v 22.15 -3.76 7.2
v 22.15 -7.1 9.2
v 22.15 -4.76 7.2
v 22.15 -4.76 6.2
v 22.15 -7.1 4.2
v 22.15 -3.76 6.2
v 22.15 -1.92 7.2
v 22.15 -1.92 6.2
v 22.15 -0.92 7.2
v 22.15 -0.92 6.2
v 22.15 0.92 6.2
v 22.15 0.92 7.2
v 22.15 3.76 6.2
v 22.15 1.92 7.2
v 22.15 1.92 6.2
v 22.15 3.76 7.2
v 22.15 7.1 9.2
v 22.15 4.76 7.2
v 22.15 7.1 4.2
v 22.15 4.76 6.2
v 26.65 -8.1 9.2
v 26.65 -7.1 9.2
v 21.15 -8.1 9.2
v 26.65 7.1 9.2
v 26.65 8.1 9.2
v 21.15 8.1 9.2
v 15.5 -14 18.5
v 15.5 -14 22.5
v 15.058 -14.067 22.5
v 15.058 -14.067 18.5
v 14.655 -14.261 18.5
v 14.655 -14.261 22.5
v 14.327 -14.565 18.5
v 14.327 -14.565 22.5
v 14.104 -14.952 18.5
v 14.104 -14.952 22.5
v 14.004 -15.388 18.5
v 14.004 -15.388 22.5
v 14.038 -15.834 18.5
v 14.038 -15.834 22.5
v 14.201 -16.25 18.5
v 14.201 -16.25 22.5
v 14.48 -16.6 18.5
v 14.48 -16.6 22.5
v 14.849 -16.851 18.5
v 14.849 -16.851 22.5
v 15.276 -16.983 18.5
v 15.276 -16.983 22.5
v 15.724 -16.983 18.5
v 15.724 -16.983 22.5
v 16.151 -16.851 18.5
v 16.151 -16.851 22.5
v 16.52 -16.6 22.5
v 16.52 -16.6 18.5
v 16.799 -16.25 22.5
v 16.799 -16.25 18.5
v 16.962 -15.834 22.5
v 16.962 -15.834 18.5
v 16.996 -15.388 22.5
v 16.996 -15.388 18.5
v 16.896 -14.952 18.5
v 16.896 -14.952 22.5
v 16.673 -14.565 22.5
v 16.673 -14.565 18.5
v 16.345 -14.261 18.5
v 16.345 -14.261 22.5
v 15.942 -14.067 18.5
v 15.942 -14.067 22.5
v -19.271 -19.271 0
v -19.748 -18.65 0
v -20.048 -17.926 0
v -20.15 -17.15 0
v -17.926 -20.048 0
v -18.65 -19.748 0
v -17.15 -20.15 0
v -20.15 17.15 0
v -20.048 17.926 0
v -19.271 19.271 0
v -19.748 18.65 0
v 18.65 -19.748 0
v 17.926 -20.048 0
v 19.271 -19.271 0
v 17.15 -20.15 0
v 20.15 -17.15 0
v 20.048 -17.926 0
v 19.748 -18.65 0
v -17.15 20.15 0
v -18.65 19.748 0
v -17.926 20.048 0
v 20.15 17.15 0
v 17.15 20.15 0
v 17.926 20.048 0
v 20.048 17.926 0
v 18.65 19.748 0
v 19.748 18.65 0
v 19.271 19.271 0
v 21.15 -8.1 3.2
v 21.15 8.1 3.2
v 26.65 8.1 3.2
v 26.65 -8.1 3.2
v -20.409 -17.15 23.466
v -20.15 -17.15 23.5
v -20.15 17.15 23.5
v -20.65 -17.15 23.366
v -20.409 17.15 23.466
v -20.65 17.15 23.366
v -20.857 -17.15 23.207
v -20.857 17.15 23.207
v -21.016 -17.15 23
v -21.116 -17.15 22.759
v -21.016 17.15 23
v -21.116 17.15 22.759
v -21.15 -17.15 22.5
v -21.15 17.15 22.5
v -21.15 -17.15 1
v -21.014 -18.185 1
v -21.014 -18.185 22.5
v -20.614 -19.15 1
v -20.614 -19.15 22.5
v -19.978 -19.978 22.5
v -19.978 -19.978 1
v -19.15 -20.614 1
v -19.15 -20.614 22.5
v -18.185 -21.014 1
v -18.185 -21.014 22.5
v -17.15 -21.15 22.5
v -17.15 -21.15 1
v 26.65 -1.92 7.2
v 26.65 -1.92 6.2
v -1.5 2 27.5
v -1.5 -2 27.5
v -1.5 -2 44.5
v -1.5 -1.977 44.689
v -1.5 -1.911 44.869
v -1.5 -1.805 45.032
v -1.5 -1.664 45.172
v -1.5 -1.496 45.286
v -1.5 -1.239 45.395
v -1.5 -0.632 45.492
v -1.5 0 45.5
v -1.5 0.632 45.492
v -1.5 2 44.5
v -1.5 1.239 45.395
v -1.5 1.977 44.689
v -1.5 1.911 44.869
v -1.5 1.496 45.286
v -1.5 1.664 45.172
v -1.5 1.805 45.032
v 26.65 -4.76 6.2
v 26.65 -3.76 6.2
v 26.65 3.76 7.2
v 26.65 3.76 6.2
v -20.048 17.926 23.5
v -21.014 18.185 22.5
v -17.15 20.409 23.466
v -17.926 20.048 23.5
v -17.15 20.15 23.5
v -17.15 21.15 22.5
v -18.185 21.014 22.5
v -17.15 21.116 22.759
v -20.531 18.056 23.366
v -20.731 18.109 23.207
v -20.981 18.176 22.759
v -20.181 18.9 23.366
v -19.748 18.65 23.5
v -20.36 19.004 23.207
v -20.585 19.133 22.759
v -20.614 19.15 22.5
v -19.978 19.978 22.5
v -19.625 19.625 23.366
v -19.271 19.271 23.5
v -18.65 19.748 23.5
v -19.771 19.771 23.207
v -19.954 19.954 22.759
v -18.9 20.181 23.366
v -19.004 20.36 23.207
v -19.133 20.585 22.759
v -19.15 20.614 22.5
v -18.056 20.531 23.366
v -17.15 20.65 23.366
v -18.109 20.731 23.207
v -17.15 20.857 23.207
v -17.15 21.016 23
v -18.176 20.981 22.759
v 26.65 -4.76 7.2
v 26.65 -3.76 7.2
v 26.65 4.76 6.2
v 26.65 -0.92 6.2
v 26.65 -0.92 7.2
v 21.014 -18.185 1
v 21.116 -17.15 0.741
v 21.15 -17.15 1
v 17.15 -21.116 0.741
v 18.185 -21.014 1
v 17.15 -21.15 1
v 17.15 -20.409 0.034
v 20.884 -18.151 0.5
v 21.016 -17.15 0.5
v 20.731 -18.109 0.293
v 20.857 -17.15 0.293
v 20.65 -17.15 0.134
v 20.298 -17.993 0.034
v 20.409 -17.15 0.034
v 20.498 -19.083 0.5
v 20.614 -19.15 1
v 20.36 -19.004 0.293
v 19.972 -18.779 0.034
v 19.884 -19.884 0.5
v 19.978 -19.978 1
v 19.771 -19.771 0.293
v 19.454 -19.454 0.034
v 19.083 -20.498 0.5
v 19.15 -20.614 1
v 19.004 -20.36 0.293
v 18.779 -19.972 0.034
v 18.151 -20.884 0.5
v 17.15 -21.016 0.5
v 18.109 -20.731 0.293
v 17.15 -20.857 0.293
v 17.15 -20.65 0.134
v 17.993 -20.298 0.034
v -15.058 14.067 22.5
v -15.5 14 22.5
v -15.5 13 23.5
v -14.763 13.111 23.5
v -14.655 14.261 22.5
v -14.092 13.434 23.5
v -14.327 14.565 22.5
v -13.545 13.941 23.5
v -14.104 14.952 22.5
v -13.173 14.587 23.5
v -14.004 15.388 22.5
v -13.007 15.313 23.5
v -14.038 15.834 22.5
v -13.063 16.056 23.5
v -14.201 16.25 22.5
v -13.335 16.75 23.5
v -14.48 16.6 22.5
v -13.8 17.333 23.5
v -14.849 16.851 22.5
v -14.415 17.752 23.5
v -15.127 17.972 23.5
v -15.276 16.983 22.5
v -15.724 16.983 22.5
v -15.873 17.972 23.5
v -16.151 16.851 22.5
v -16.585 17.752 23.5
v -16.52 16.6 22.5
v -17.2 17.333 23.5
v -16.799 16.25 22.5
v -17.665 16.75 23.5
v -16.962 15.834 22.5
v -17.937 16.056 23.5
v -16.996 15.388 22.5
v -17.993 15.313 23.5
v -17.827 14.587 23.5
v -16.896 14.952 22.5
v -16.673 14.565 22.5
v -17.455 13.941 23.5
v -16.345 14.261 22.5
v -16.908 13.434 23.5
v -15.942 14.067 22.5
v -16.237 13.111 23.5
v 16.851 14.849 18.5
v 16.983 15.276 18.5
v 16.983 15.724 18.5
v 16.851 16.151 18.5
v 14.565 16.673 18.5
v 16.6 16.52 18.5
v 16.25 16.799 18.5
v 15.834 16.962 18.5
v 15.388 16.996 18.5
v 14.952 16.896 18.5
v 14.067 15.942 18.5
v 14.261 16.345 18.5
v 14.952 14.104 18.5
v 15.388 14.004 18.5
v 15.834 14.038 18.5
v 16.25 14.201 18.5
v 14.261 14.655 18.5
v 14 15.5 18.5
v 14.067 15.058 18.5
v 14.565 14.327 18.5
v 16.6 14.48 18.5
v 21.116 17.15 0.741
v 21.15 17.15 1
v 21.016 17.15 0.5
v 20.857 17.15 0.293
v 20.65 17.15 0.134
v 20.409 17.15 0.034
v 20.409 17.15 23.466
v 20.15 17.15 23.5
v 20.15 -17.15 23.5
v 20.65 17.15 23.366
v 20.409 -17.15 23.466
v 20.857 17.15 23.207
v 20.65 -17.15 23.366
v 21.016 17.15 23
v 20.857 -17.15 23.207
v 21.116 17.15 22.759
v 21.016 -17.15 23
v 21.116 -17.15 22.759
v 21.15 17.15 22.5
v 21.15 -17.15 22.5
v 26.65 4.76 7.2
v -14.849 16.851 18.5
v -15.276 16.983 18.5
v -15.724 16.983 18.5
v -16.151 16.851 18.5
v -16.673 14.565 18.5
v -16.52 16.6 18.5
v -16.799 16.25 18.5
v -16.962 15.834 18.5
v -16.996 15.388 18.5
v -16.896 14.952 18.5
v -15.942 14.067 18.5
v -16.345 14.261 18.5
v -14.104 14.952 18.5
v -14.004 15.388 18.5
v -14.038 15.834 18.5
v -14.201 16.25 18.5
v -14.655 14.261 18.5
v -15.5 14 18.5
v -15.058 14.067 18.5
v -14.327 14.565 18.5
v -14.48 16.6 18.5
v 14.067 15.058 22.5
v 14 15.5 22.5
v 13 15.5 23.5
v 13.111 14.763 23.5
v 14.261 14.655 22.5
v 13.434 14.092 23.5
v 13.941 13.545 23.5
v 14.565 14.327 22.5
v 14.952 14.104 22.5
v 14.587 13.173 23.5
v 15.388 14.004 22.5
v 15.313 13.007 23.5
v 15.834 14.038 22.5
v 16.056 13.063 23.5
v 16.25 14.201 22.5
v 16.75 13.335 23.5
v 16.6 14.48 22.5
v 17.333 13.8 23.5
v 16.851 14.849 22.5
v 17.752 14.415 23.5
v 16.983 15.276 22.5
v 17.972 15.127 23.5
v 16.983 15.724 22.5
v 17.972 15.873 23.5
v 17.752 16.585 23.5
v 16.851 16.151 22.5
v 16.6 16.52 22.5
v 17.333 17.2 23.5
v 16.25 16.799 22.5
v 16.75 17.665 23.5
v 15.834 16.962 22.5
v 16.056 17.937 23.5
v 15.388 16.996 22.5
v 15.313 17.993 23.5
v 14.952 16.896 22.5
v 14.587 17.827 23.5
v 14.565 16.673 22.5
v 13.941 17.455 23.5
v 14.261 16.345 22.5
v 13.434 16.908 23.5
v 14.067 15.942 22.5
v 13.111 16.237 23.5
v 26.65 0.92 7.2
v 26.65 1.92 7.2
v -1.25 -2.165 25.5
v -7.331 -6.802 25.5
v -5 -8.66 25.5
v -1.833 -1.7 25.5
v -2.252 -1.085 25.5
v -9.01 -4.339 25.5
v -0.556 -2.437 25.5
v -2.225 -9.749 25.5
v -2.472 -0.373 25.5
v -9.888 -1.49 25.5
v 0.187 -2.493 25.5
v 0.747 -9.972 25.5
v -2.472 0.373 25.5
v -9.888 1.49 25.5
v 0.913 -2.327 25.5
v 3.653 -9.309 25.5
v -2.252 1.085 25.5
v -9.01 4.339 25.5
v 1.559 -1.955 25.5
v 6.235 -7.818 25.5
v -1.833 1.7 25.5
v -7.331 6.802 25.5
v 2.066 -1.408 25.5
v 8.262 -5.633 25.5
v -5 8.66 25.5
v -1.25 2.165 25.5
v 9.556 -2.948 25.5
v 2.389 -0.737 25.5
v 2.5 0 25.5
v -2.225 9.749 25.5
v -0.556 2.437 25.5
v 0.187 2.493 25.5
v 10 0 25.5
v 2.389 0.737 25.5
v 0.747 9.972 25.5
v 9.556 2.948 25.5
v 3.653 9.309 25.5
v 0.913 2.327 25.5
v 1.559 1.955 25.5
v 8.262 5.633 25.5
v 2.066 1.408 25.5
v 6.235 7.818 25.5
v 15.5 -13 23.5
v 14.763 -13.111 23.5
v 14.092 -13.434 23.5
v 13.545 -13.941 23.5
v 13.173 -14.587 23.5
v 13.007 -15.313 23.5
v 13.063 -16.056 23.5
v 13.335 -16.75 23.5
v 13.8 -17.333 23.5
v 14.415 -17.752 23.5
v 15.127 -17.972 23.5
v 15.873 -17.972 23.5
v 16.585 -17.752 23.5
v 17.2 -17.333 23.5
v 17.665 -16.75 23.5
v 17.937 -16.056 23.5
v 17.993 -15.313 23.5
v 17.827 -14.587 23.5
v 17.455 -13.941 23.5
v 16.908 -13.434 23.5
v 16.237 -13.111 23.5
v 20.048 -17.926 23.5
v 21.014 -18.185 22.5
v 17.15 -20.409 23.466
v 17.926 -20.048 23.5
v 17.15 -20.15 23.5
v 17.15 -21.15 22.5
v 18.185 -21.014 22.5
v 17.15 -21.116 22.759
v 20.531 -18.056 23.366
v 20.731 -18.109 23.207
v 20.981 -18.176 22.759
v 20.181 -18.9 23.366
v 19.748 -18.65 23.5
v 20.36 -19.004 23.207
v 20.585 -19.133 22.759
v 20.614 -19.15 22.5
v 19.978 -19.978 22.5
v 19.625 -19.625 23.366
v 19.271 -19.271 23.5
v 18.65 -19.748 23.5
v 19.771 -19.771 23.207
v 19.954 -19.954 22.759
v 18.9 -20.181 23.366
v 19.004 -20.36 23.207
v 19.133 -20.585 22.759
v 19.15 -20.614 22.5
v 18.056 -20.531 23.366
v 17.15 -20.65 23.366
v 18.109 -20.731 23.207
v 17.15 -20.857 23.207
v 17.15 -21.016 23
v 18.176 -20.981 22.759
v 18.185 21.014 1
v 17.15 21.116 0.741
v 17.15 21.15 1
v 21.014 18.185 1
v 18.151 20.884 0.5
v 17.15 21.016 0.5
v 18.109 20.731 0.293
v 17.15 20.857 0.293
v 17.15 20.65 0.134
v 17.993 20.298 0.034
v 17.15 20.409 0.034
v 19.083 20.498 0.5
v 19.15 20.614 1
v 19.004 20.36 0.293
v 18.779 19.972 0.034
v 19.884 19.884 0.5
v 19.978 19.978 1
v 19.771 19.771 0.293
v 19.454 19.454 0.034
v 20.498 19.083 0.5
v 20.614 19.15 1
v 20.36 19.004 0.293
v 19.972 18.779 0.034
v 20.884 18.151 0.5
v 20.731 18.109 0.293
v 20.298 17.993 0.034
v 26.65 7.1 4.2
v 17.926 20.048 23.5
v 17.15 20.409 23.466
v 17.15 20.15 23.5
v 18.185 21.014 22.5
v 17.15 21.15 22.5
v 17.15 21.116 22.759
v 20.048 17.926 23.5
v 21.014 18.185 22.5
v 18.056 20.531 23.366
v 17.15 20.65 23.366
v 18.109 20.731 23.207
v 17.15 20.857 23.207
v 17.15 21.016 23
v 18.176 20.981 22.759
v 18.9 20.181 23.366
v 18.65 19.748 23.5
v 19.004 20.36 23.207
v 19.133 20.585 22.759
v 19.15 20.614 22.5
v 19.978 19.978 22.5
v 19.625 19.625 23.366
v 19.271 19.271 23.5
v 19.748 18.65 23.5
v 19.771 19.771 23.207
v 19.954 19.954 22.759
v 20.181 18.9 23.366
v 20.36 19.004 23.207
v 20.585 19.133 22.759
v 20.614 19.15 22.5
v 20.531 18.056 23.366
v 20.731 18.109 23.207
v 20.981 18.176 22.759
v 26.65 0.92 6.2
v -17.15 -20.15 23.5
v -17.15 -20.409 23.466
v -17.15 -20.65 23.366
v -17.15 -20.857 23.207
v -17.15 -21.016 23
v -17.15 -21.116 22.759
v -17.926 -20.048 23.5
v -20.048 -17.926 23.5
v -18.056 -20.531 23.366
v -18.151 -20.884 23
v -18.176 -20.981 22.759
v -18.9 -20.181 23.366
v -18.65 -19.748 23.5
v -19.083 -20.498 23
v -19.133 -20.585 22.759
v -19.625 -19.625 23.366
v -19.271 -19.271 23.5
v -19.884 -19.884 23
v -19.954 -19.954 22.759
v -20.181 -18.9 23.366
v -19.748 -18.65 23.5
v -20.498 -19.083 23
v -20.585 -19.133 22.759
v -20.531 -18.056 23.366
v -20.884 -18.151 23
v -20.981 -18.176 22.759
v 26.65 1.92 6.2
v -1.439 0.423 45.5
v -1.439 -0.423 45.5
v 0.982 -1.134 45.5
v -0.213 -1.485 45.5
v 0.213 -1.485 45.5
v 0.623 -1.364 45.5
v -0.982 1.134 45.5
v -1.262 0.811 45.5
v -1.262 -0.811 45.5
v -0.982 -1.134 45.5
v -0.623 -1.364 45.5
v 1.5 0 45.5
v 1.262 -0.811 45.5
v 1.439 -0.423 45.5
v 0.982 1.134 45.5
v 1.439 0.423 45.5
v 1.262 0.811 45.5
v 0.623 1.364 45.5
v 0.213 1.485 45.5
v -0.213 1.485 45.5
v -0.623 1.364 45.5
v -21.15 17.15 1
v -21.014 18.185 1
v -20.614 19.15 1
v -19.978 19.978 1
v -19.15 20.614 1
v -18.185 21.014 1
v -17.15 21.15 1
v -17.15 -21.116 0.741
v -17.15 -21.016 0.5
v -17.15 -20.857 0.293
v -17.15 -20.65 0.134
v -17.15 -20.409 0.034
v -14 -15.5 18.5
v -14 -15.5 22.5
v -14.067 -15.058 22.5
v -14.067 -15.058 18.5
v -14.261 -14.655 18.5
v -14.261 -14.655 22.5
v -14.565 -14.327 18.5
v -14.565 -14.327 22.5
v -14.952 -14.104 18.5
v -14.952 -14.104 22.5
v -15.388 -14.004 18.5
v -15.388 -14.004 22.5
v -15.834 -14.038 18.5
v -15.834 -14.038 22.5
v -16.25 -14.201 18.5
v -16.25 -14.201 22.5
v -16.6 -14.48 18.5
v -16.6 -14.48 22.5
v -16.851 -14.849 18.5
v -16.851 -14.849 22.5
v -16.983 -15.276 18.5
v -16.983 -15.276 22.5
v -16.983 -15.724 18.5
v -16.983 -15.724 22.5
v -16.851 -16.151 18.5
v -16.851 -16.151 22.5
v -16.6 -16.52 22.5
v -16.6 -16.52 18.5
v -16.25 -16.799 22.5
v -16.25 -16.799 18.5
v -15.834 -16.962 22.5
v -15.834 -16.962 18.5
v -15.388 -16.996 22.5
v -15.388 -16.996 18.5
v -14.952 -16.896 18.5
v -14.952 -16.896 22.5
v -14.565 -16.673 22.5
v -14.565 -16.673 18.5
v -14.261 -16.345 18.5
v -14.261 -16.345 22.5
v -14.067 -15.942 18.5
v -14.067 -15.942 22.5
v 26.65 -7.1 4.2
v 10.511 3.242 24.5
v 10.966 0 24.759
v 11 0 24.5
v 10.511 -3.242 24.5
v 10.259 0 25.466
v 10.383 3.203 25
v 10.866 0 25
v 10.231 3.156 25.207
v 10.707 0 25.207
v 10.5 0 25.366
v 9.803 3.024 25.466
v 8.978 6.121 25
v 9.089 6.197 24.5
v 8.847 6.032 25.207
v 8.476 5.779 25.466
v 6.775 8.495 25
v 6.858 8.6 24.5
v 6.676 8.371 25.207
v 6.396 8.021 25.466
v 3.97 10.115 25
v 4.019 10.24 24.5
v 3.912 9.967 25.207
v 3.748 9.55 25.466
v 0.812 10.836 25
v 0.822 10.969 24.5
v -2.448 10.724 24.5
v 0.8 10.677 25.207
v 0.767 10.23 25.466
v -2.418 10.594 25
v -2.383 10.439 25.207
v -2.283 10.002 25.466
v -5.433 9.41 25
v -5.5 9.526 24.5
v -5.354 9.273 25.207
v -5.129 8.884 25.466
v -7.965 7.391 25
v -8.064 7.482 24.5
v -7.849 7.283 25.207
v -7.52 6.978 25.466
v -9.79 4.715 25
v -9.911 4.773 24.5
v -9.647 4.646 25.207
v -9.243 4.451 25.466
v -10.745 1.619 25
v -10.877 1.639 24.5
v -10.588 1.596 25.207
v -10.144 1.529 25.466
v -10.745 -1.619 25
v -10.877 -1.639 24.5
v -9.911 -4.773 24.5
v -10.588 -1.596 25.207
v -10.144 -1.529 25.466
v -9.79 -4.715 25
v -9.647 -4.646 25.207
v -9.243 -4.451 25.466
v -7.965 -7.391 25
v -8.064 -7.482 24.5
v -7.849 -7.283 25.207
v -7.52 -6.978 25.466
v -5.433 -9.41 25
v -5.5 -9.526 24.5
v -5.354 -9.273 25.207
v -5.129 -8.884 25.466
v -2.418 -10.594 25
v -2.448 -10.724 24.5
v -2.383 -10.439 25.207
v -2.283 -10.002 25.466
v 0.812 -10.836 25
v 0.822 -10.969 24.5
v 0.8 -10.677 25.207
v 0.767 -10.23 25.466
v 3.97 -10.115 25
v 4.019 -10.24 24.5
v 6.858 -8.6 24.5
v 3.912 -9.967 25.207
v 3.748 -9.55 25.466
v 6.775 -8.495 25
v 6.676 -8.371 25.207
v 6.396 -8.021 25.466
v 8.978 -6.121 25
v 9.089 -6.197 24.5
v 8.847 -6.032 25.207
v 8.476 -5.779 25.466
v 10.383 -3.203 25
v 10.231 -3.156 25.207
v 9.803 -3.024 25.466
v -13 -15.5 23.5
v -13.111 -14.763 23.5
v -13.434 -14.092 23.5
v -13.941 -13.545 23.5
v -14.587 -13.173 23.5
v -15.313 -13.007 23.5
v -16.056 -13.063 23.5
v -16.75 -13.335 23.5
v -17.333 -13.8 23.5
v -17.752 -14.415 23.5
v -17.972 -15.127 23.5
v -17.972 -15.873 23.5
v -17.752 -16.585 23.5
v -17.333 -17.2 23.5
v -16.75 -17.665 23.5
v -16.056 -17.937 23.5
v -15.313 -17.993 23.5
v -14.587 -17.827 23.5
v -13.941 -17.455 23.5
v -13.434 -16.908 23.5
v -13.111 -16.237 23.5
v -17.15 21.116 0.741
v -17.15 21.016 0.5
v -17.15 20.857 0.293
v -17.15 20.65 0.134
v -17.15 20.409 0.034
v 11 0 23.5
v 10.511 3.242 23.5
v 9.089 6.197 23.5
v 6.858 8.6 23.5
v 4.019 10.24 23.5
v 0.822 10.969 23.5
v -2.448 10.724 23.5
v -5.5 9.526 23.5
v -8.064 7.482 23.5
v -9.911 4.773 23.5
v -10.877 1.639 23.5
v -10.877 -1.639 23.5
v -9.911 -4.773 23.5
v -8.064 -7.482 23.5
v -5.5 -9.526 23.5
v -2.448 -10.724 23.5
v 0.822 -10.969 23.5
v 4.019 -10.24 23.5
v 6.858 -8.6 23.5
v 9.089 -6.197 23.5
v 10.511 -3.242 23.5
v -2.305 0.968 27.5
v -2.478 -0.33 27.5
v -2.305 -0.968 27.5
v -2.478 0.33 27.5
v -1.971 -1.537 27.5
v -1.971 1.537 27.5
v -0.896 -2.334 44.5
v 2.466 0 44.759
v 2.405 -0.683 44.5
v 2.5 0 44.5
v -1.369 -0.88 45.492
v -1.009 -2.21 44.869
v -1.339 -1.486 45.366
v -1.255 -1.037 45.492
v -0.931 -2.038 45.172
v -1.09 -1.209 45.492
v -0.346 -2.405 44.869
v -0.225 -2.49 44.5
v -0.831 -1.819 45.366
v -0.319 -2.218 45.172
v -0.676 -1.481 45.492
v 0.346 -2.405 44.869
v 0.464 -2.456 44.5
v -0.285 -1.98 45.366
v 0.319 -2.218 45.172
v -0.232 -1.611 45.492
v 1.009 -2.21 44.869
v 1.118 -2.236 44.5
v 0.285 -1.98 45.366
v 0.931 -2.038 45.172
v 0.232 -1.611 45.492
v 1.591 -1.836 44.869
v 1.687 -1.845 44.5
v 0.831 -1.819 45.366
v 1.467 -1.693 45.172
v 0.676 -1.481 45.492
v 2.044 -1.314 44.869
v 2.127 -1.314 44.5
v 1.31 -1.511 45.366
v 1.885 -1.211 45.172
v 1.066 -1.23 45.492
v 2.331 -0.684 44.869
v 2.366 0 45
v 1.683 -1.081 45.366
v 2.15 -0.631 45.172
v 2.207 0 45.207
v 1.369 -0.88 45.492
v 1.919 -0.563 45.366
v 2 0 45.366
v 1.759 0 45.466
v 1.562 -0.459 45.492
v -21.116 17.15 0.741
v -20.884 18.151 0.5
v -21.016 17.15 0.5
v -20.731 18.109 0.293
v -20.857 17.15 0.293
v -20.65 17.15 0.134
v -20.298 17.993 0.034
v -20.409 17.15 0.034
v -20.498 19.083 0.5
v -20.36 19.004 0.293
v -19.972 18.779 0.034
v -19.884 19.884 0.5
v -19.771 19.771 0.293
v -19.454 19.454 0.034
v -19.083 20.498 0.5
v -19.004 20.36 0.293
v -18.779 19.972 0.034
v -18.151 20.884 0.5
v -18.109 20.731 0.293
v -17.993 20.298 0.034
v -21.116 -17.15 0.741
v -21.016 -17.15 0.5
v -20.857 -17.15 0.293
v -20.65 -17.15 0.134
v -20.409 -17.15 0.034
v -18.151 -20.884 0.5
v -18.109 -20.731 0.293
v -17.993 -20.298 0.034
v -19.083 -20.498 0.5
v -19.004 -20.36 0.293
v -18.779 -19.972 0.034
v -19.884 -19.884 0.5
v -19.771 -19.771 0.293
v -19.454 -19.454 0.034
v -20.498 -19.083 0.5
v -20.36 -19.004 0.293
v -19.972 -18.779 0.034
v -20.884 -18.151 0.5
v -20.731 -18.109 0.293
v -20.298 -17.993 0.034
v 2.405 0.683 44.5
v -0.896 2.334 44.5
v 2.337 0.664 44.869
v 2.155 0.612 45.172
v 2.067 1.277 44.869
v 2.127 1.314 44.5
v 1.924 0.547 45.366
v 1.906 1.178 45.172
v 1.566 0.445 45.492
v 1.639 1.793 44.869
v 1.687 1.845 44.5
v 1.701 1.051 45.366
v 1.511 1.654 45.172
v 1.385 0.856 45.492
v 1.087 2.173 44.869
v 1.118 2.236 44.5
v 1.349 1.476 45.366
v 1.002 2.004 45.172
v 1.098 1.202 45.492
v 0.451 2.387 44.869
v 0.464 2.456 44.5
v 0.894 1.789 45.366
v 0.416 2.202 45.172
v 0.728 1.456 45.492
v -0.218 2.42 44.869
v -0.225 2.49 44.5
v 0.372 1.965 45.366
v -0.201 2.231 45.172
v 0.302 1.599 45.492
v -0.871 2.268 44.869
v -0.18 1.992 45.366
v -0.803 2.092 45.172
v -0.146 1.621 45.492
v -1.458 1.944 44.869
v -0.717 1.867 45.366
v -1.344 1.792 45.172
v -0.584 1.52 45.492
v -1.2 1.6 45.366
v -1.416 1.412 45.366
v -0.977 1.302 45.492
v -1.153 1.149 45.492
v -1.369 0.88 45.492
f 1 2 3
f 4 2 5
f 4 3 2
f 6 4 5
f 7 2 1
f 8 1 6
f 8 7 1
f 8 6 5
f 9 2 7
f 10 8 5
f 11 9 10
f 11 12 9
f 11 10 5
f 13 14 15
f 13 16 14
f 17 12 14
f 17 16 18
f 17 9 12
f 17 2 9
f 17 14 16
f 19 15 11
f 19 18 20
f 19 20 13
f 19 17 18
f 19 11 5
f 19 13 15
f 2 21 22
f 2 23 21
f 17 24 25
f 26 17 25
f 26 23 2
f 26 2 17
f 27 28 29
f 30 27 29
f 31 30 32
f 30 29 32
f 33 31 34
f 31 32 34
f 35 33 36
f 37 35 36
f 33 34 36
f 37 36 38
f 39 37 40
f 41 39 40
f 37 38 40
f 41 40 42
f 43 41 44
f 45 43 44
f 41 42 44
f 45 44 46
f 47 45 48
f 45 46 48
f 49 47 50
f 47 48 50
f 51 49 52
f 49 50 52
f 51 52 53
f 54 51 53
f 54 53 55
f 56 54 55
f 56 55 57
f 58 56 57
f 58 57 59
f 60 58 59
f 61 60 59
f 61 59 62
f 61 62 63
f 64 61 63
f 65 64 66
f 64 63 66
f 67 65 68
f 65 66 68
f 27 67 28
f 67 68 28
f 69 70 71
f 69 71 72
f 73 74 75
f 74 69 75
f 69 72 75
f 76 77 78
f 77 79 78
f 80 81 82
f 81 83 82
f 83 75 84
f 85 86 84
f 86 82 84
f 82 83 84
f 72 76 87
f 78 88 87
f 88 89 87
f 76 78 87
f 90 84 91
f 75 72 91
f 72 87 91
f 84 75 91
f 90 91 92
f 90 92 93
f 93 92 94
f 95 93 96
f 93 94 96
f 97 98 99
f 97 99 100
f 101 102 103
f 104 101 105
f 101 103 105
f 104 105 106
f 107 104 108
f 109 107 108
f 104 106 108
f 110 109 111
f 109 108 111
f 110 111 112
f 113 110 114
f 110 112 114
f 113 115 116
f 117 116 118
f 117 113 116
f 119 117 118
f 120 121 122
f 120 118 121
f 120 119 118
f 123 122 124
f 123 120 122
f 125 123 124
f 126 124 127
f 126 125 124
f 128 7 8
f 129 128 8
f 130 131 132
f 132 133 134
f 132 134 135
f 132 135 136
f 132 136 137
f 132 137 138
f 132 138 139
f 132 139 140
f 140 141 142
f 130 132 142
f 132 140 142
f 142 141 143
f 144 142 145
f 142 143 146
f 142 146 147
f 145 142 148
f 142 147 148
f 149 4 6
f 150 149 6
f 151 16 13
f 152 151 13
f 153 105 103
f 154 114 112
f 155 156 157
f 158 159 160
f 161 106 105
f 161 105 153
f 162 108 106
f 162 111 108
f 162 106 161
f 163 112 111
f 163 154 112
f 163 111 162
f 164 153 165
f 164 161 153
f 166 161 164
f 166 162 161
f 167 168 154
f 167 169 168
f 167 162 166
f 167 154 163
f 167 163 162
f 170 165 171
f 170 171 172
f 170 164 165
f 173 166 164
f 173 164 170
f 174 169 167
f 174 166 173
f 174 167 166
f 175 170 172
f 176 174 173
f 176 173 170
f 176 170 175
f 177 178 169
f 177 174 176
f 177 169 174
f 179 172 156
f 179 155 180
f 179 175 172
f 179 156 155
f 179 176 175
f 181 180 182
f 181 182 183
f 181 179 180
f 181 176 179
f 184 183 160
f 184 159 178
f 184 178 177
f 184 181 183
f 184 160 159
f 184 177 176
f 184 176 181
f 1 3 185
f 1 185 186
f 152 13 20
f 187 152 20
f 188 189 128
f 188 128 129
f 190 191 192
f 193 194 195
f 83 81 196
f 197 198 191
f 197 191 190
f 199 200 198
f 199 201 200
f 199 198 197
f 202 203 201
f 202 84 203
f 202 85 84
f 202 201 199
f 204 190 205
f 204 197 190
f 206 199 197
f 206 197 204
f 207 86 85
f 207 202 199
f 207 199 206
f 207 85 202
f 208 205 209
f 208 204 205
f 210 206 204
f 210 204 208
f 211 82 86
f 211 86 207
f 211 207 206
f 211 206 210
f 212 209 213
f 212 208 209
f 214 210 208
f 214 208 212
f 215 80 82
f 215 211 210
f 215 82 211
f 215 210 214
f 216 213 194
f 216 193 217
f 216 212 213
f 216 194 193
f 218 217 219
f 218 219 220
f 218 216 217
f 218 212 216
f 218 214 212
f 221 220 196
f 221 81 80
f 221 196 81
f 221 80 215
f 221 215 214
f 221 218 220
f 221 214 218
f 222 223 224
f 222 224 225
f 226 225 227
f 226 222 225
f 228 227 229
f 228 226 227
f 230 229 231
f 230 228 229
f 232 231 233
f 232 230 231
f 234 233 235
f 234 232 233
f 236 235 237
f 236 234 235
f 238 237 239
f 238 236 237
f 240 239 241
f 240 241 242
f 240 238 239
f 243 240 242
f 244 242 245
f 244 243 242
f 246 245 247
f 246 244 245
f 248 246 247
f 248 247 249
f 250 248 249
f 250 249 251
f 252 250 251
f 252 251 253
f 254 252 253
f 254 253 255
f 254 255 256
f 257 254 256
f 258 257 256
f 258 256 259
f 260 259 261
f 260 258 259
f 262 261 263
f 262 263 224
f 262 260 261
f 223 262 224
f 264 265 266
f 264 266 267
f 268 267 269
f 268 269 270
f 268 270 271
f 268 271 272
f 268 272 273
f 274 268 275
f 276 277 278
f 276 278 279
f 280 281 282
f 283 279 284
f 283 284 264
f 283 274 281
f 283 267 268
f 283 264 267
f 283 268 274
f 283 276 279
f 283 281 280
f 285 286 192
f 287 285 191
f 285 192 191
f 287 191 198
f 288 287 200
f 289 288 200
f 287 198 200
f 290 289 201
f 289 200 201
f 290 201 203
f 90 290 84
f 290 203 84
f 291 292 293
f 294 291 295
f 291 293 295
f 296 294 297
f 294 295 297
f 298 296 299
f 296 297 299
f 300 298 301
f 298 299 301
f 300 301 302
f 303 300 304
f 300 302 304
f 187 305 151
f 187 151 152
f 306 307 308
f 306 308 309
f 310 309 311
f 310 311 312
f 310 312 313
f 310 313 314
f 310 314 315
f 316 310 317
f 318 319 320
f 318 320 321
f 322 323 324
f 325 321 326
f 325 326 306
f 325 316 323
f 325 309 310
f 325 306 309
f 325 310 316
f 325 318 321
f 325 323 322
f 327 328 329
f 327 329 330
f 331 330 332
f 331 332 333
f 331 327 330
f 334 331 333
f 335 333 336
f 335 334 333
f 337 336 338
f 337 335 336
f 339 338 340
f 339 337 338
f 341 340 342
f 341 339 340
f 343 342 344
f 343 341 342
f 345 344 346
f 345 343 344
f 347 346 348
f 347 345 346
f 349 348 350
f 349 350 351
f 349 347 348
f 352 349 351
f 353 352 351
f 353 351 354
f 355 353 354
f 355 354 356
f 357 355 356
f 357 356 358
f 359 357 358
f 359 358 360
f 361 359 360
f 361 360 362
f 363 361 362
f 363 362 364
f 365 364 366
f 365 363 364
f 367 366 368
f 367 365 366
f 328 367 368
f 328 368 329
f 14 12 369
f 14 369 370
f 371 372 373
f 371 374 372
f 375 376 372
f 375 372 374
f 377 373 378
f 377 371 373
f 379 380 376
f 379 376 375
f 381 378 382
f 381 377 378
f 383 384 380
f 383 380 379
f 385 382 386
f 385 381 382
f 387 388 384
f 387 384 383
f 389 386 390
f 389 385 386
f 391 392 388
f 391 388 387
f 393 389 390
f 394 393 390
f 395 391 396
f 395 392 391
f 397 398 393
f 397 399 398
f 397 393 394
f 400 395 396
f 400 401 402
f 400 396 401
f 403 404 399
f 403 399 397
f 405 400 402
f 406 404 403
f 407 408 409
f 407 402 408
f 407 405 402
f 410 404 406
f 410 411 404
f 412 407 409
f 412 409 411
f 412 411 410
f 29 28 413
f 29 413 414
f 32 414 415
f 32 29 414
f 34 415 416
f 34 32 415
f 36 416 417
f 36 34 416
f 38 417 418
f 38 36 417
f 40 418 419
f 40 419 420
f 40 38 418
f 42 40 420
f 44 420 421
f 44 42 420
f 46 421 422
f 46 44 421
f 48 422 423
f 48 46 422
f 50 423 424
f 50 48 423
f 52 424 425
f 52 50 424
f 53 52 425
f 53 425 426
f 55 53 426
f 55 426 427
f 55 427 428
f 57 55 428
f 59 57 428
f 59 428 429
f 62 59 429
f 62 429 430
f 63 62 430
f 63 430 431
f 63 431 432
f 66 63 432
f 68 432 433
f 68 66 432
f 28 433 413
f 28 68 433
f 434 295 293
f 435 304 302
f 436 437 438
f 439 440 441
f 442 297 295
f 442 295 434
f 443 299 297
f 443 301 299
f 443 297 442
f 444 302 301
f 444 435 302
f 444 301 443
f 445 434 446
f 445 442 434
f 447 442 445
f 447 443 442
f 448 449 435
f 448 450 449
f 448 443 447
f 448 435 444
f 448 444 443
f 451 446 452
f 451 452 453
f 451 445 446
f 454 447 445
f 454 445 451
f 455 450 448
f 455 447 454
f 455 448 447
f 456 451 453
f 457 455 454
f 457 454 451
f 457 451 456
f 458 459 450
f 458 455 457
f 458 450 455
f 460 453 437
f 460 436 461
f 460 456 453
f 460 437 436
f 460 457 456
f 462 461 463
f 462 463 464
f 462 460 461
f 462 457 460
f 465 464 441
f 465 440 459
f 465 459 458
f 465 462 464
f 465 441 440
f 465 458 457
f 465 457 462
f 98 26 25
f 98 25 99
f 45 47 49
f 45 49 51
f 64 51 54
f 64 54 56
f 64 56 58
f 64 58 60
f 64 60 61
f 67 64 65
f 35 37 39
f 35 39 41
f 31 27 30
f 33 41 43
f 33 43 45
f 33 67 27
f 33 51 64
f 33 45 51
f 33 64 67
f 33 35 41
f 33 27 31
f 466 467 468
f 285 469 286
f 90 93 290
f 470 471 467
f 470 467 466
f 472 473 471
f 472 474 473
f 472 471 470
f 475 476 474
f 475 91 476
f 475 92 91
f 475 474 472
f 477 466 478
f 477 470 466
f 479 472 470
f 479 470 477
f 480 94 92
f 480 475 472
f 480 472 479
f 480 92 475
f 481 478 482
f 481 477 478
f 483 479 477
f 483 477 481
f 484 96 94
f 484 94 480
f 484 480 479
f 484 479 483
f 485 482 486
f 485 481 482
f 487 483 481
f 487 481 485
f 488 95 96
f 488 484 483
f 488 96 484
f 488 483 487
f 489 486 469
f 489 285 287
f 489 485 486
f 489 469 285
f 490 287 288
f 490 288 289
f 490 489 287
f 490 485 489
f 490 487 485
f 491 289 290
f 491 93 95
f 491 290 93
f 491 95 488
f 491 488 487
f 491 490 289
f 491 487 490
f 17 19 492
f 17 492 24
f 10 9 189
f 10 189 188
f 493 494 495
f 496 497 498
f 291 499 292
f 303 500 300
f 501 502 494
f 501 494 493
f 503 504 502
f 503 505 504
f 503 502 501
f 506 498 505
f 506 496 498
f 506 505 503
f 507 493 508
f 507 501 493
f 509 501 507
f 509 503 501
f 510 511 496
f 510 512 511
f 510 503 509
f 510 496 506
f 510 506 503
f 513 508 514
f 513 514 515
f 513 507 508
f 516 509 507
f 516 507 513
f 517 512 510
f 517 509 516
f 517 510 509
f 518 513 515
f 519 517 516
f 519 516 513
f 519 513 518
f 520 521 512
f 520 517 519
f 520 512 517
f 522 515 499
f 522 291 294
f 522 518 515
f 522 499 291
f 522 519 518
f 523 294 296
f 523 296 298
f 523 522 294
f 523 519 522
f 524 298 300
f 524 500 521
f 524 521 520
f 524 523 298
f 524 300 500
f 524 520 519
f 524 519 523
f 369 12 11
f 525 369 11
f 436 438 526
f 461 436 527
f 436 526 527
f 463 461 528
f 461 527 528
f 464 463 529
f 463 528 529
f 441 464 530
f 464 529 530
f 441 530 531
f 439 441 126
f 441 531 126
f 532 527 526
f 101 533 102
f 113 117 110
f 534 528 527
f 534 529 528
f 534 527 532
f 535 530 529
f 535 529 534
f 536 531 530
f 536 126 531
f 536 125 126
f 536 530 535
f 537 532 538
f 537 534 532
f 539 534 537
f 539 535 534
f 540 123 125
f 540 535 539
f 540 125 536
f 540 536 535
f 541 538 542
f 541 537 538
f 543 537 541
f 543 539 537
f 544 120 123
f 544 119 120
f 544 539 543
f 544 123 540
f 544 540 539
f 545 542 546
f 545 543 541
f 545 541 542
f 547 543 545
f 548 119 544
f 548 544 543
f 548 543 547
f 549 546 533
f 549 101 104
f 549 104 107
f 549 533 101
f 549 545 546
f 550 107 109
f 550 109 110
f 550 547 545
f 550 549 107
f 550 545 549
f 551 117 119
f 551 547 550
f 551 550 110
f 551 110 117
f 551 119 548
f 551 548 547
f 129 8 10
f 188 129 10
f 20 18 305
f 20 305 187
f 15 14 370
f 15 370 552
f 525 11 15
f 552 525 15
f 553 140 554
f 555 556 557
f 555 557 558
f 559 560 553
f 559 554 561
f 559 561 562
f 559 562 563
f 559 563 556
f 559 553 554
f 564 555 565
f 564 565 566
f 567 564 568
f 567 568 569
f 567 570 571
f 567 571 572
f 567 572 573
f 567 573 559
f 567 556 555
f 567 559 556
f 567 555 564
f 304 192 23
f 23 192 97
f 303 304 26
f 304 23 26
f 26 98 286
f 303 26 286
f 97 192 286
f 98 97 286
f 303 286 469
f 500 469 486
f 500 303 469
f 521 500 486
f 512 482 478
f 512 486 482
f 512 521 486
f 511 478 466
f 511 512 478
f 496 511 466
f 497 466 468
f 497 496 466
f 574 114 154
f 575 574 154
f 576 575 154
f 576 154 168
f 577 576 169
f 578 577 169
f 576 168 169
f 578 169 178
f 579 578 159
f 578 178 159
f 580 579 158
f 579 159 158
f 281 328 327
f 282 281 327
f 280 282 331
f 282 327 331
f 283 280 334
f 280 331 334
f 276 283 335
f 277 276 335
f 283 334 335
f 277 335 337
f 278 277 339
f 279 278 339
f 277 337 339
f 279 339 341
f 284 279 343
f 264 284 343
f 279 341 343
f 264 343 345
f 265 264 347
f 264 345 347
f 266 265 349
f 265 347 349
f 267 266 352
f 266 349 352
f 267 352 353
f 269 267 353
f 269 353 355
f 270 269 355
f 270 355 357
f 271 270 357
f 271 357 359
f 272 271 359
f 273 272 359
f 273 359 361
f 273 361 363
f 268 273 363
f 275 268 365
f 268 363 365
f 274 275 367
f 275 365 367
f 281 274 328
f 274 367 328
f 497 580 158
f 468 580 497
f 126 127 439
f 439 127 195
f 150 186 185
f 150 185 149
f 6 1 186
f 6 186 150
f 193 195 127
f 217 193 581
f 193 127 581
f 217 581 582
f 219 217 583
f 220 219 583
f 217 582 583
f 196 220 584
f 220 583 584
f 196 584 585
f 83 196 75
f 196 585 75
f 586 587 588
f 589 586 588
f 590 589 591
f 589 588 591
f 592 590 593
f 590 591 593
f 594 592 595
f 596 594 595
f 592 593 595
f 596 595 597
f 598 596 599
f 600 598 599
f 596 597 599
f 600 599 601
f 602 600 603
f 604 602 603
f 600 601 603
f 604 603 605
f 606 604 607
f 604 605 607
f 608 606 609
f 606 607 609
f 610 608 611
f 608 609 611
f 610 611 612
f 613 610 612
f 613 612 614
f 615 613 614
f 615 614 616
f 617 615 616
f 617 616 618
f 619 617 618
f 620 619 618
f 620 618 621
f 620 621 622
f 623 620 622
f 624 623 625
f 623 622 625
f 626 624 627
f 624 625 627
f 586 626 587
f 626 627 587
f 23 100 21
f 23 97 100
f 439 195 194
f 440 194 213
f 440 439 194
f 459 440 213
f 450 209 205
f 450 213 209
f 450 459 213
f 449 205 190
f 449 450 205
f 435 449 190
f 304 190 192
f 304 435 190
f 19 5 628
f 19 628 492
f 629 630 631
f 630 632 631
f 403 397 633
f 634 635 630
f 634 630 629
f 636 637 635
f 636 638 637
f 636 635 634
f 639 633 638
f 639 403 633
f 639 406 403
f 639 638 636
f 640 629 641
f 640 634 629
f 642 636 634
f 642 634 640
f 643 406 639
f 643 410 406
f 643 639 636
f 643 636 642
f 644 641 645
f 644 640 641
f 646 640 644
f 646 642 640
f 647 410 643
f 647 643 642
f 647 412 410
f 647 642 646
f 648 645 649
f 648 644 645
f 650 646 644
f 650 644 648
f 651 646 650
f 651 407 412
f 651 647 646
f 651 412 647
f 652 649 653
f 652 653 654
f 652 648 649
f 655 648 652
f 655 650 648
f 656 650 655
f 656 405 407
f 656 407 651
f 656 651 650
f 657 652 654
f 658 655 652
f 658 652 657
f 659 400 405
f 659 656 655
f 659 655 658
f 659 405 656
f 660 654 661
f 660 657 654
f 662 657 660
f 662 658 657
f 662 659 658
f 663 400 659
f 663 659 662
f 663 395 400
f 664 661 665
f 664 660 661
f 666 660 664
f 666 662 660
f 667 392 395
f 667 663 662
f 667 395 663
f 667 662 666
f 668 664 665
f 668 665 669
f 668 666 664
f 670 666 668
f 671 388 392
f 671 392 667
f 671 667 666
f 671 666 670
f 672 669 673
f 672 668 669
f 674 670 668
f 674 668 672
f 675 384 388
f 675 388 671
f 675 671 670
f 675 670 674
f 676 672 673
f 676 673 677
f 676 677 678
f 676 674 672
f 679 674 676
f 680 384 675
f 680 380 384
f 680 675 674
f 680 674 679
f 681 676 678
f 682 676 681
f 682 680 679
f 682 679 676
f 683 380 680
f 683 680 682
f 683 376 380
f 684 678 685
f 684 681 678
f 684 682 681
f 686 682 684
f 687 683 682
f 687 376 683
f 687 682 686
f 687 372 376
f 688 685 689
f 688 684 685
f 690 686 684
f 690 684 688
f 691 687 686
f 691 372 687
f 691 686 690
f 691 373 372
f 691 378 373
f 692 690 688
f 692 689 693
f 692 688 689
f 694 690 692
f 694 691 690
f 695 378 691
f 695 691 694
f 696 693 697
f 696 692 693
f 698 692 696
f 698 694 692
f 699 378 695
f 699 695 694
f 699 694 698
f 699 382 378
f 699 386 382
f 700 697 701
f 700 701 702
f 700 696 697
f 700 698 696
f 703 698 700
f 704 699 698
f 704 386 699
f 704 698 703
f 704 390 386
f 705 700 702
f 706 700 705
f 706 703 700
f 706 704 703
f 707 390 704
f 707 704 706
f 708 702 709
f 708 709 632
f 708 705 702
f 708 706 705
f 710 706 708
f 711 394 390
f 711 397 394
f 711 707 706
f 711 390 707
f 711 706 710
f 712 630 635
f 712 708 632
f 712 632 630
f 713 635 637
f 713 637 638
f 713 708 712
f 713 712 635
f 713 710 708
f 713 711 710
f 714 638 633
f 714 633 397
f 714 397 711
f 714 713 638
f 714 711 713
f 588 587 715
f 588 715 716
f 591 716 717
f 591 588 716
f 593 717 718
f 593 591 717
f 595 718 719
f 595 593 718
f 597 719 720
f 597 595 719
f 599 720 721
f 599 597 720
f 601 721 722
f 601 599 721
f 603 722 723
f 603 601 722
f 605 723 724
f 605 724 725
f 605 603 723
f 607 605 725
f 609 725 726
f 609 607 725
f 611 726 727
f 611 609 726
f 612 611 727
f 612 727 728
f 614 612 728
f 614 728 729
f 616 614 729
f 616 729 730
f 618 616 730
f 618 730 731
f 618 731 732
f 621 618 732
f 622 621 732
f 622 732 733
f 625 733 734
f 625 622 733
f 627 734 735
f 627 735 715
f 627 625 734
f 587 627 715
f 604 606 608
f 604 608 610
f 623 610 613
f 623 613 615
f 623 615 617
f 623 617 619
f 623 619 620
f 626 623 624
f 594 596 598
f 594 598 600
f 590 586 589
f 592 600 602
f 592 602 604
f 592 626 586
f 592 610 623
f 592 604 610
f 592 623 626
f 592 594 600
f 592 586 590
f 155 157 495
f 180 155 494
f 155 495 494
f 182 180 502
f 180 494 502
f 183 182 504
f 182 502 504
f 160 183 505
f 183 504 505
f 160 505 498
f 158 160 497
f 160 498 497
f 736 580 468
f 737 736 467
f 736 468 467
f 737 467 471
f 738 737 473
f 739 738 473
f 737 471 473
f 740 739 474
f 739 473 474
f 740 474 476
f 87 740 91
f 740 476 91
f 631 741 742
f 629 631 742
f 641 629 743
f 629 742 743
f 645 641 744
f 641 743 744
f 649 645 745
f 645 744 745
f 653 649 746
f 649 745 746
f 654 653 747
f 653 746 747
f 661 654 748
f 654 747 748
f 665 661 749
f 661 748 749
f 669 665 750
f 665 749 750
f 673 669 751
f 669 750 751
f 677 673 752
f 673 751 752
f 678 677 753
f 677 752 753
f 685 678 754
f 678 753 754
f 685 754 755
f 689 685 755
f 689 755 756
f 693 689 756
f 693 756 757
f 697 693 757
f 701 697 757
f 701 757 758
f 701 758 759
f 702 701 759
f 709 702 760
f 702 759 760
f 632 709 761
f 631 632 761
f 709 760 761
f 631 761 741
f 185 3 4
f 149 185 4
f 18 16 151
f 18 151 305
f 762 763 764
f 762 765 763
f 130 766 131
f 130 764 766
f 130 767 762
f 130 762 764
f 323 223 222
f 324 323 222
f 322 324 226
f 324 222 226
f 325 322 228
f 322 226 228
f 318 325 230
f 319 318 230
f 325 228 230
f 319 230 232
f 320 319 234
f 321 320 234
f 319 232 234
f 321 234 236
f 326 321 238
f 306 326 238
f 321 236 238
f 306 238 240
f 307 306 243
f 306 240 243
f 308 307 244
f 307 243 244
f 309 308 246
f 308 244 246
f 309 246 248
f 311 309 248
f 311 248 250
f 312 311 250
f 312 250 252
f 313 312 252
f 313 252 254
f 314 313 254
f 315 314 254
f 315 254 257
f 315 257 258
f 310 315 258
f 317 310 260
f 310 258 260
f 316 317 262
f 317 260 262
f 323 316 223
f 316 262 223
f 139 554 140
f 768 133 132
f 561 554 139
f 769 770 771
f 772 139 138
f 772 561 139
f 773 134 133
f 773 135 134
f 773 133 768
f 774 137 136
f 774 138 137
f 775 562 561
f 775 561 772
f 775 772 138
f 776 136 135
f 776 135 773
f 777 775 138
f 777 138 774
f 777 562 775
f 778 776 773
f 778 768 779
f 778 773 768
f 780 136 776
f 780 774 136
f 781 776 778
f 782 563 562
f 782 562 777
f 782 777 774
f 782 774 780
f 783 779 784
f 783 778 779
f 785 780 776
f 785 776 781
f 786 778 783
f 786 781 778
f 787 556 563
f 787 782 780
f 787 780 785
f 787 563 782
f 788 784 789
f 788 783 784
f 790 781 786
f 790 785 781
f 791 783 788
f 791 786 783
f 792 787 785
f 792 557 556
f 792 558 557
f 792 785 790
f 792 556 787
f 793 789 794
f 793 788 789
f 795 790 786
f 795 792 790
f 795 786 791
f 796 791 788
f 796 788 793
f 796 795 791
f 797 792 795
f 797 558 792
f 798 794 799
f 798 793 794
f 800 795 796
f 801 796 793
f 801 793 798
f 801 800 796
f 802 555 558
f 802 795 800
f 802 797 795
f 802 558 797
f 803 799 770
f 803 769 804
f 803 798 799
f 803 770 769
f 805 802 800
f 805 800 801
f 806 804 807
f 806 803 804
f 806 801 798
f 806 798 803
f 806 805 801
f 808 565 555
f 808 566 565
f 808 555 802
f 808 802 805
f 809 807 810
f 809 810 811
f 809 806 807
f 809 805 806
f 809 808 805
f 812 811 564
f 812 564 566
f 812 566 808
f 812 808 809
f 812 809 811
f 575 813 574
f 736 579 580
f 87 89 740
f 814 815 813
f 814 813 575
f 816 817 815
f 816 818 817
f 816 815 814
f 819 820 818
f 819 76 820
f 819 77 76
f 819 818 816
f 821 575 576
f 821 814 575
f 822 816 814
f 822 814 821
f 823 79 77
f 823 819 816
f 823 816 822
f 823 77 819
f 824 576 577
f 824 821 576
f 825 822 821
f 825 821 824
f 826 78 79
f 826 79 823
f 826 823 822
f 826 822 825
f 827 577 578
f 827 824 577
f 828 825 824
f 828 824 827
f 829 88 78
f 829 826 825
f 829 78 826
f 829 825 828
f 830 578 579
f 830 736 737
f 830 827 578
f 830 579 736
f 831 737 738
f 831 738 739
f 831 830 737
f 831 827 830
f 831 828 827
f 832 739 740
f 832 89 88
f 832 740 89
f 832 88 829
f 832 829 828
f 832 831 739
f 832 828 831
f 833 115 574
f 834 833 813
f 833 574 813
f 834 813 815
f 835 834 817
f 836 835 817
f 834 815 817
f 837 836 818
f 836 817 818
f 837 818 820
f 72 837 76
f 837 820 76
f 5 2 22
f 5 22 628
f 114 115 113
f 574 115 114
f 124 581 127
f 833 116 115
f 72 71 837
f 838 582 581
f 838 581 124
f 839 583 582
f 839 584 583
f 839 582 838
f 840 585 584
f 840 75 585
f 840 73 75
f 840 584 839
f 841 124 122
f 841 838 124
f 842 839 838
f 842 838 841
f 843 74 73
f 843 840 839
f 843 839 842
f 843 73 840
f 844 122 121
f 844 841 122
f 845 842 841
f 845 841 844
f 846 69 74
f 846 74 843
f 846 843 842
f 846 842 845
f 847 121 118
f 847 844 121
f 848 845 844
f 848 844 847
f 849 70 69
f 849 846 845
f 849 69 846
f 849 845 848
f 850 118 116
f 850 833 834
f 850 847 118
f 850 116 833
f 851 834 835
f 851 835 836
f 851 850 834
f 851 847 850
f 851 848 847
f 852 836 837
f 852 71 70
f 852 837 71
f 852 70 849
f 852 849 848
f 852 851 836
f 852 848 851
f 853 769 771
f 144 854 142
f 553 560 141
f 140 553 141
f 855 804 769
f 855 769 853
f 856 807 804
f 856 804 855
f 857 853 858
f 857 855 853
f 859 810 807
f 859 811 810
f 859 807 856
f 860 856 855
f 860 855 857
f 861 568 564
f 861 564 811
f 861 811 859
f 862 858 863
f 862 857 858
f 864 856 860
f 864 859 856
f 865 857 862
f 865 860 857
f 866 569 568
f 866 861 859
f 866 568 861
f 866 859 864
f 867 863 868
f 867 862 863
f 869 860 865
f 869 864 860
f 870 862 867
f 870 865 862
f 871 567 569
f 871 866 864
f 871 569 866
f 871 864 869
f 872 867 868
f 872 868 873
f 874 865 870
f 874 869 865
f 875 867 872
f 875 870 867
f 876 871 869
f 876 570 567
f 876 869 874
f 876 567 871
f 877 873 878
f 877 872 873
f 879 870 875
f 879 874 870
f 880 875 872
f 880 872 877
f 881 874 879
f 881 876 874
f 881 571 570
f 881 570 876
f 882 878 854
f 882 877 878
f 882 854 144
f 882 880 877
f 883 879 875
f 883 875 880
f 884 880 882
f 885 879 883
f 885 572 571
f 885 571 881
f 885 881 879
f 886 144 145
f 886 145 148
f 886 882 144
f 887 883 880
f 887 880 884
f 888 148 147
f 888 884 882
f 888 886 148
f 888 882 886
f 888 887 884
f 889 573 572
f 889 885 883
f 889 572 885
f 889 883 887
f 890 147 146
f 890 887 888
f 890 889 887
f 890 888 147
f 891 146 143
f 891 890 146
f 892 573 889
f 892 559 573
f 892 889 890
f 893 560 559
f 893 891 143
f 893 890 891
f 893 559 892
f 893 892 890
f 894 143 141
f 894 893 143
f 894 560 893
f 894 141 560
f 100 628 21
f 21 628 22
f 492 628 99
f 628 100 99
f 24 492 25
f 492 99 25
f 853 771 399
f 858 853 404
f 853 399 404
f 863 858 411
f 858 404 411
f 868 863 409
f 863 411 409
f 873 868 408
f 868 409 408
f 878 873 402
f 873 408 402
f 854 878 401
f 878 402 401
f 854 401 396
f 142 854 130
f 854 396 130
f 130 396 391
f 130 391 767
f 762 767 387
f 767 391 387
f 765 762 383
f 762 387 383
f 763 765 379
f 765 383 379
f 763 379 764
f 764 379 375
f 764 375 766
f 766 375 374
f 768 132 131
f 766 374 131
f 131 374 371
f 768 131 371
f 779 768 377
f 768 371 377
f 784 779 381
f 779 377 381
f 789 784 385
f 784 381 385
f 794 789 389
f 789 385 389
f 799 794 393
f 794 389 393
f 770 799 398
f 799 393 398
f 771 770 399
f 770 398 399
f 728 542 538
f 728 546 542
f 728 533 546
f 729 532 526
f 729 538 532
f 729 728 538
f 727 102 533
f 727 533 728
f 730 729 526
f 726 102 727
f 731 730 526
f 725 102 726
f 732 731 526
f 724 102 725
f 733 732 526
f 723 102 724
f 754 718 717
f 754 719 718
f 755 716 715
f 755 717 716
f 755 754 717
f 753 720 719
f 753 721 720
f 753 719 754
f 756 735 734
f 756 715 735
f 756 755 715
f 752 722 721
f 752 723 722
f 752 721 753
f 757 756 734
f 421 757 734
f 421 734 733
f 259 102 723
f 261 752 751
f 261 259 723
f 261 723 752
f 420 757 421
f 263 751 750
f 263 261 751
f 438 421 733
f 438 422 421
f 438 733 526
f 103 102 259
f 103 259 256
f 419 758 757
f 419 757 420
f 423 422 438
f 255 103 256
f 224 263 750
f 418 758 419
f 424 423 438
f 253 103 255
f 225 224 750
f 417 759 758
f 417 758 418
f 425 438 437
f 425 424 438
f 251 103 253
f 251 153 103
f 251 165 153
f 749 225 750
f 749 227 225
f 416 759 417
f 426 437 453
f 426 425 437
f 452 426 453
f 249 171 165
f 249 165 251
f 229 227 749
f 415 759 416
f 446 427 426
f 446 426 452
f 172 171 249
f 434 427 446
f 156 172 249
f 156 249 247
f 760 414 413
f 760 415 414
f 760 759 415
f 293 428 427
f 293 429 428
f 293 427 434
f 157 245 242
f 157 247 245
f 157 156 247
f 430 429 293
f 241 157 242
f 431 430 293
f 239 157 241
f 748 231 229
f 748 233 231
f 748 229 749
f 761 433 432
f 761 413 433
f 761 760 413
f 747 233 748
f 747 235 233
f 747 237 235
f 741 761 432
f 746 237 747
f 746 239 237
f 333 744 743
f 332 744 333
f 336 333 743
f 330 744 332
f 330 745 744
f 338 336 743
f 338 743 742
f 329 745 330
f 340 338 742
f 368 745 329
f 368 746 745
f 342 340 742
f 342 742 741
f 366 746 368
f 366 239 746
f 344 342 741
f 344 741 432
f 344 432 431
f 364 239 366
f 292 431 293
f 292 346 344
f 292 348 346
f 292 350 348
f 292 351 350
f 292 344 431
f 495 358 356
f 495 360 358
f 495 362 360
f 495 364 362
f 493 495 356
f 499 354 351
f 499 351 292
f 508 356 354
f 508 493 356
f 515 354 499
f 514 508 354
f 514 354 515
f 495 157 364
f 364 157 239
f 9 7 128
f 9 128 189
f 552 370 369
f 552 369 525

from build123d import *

# Parameters (mm, degrees)
SKETCH1_W                    = 42.3
SKETCH1_H                    = 42.3
BOSS_EXTRUDE1_DEPTH          = 23.5
FILLET1_R                    = 4
SKETCH2_R                    = 1.5
CUT_EXTRUDE1_DEPTH           = 5
CHAMFER1_SIZE                = 1
CIRPATTERN1_COUNT            = 4
CHAMFER1_OF_CIRPATTERN1_SIZE = 1
SKETCH3_R                    = 11
BOSS_EXTRUDE2_DEPTH          = 2
SKETCH4_R                    = 2.5
BOSS_EXTRUDE3_DEPTH          = 20
FILLET2_R                    = 1
SKETCH5_W                    = 6
SKETCH5_H                    = 16.2
BOSS_EXTRUDE4_DEPTH          = 1
SKETCH6_W                    = 1
SKETCH6_H                    = 1
BOSS_EXTRUDE5_DEPTH          = 4.5
SKETCH7_W                    = 4
SKETCH7_H                    = 4
CUT_EXTRUDE2_DEPTH           = 18


with BuildPart() as part:
    # Sketch1 → Boss-Extrude1 (new body)
    with BuildSketch(Plane.XY):
        Rectangle(SKETCH1_W, SKETCH1_H)
    extrude(amount=BOSS_EXTRUDE1_DEPTH)

    # Fillet1
    fillet1_edges = [part.edges().sort_by_distance(p)[0] for p in [
        (-21.15, 21.15, 11.75),
        (21.15, 21.15, 11.75),
        (21.15, -21.15, 11.75),
        (-21.15, -21.15, 11.75),
    ]]
    fillet(fillet1_edges, radius=FILLET1_R)

    # Sketch2 → Cut-Extrude1 (cut)
    with BuildSketch(Plane.XY.offset(23.5)):
        with Locations((-15.5, -15.5)):
            Circle(SKETCH2_R)
    cut_extrude1 = extrude(amount=-CUT_EXTRUDE1_DEPTH, mode=Mode.SUBTRACT)

    # Chamfer1
    chamfer1_edges = [part.edges().sort_by_distance(p)[0] for p in [
        (-17, -15.5, 23.5),
    ]]
    chamfer(chamfer1_edges, length=CHAMFER1_SIZE)

    # CirPattern1: Cut-Extrude1 ×4 about axis
    cirpattern1_axis = Axis((0, 0, 23.5), (0, 0, 1))
    for i in range(1, CIRPATTERN1_COUNT):
        add(cut_extrude1.rotate(cirpattern1_axis, i * 360 / CIRPATTERN1_COUNT), mode=Mode.SUBTRACT)

    # Chamfer1 of CirPattern1
    chamfer1_of_cirpattern1_edges = [part.edges().sort_by_distance(p)[0] for p in [
        (15.5, -17, 23.5),
        (17, 15.5, 23.5),
        (-15.5, 17, 23.5),
    ]]
    chamfer(chamfer1_of_cirpattern1_edges, length=CHAMFER1_OF_CIRPATTERN1_SIZE)

    # Sketch3 → Boss-Extrude2 (add)
    with BuildSketch(Plane.XY.offset(23.5)):
        Circle(SKETCH3_R)
    extrude(amount=BOSS_EXTRUDE2_DEPTH)

    # Sketch4 → Boss-Extrude3 (add)
    with BuildSketch(Plane.XY.offset(25.5)):
        Circle(SKETCH4_R)
    extrude(amount=BOSS_EXTRUDE3_DEPTH)

    # Fillet2
    fillet2_edges = [part.edges().sort_by_distance(p)[0] for p in [
        (19.978427125, -19.978427125, 0),
        (0, -21.15, 0),
        (-19.978427125, -19.978427125, 0),
        (-21.15, 0, 0),
        (-19.978427125, 19.978427125, 0),
        (0, 21.15, 0),
        (19.978427125, 19.978427125, 0),
        (19.978427125, 19.978427125, 23.5),
        (21.15, 0, 23.5),
        (19.978427125, -19.978427125, 23.5),
        (0, -21.15, 23.5),
        (-19.978427125, -19.978427125, 23.5),
        (-21.15, 0, 23.5),
        (-19.978427125, 19.978427125, 23.5),
        (21.15, 0, 0),
        (0, 21.15, 23.5),
        (-11, 0, 25.5),
        (-2.5, 0, 45.5),
    ]]
    fillet(fillet2_edges, radius=FILLET2_R)

    # Sketch5 → Boss-Extrude4 (add)
    with BuildSketch(Plane(origin=(21.15, 0, 0), x_dir=(0, 0, -1), z_dir=(1, 0, 0))):
        with Locations((-6.2, 0)):
            Rectangle(SKETCH5_W, SKETCH5_H)
    extrude(amount=BOSS_EXTRUDE4_DEPTH)

    # Sketch6 → Boss-Extrude5 (add)
    with BuildSketch(Plane(origin=(22.15, 0, 0), x_dir=(0, 0, -1), z_dir=(1, 0, 0))):
        Polygon((-9.2, -7.1), (-4.2, -7.1), (-4.2, 7.1), (-9.2, 7.1), (-9.2, 8.1), (-3.2, 8.1), (-3.2, -8.1), (-9.2, -8.1), align=None)
        with Locations((-6.7, -4.26)):
            Rectangle(SKETCH6_W, SKETCH6_H)
        with Locations((-6.7, 1.42)):
            Rectangle(SKETCH6_W, SKETCH6_H)
        with Locations((-6.7, 4.26)):
            Rectangle(SKETCH6_W, SKETCH6_H)
        with Locations((-6.7, -1.42)):
            Rectangle(SKETCH6_W, SKETCH6_H)
    extrude(amount=BOSS_EXTRUDE5_DEPTH)

    # Sketch7 → Cut-Extrude2 (cut)
    with BuildSketch(Plane.XY.offset(45.5)):
        with Locations((-3.5, 0)):
            Rectangle(SKETCH7_W, SKETCH7_H)
    extrude(amount=-CUT_EXTRUDE2_DEPTH, mode=Mode.SUBTRACT)


solid = part.part
